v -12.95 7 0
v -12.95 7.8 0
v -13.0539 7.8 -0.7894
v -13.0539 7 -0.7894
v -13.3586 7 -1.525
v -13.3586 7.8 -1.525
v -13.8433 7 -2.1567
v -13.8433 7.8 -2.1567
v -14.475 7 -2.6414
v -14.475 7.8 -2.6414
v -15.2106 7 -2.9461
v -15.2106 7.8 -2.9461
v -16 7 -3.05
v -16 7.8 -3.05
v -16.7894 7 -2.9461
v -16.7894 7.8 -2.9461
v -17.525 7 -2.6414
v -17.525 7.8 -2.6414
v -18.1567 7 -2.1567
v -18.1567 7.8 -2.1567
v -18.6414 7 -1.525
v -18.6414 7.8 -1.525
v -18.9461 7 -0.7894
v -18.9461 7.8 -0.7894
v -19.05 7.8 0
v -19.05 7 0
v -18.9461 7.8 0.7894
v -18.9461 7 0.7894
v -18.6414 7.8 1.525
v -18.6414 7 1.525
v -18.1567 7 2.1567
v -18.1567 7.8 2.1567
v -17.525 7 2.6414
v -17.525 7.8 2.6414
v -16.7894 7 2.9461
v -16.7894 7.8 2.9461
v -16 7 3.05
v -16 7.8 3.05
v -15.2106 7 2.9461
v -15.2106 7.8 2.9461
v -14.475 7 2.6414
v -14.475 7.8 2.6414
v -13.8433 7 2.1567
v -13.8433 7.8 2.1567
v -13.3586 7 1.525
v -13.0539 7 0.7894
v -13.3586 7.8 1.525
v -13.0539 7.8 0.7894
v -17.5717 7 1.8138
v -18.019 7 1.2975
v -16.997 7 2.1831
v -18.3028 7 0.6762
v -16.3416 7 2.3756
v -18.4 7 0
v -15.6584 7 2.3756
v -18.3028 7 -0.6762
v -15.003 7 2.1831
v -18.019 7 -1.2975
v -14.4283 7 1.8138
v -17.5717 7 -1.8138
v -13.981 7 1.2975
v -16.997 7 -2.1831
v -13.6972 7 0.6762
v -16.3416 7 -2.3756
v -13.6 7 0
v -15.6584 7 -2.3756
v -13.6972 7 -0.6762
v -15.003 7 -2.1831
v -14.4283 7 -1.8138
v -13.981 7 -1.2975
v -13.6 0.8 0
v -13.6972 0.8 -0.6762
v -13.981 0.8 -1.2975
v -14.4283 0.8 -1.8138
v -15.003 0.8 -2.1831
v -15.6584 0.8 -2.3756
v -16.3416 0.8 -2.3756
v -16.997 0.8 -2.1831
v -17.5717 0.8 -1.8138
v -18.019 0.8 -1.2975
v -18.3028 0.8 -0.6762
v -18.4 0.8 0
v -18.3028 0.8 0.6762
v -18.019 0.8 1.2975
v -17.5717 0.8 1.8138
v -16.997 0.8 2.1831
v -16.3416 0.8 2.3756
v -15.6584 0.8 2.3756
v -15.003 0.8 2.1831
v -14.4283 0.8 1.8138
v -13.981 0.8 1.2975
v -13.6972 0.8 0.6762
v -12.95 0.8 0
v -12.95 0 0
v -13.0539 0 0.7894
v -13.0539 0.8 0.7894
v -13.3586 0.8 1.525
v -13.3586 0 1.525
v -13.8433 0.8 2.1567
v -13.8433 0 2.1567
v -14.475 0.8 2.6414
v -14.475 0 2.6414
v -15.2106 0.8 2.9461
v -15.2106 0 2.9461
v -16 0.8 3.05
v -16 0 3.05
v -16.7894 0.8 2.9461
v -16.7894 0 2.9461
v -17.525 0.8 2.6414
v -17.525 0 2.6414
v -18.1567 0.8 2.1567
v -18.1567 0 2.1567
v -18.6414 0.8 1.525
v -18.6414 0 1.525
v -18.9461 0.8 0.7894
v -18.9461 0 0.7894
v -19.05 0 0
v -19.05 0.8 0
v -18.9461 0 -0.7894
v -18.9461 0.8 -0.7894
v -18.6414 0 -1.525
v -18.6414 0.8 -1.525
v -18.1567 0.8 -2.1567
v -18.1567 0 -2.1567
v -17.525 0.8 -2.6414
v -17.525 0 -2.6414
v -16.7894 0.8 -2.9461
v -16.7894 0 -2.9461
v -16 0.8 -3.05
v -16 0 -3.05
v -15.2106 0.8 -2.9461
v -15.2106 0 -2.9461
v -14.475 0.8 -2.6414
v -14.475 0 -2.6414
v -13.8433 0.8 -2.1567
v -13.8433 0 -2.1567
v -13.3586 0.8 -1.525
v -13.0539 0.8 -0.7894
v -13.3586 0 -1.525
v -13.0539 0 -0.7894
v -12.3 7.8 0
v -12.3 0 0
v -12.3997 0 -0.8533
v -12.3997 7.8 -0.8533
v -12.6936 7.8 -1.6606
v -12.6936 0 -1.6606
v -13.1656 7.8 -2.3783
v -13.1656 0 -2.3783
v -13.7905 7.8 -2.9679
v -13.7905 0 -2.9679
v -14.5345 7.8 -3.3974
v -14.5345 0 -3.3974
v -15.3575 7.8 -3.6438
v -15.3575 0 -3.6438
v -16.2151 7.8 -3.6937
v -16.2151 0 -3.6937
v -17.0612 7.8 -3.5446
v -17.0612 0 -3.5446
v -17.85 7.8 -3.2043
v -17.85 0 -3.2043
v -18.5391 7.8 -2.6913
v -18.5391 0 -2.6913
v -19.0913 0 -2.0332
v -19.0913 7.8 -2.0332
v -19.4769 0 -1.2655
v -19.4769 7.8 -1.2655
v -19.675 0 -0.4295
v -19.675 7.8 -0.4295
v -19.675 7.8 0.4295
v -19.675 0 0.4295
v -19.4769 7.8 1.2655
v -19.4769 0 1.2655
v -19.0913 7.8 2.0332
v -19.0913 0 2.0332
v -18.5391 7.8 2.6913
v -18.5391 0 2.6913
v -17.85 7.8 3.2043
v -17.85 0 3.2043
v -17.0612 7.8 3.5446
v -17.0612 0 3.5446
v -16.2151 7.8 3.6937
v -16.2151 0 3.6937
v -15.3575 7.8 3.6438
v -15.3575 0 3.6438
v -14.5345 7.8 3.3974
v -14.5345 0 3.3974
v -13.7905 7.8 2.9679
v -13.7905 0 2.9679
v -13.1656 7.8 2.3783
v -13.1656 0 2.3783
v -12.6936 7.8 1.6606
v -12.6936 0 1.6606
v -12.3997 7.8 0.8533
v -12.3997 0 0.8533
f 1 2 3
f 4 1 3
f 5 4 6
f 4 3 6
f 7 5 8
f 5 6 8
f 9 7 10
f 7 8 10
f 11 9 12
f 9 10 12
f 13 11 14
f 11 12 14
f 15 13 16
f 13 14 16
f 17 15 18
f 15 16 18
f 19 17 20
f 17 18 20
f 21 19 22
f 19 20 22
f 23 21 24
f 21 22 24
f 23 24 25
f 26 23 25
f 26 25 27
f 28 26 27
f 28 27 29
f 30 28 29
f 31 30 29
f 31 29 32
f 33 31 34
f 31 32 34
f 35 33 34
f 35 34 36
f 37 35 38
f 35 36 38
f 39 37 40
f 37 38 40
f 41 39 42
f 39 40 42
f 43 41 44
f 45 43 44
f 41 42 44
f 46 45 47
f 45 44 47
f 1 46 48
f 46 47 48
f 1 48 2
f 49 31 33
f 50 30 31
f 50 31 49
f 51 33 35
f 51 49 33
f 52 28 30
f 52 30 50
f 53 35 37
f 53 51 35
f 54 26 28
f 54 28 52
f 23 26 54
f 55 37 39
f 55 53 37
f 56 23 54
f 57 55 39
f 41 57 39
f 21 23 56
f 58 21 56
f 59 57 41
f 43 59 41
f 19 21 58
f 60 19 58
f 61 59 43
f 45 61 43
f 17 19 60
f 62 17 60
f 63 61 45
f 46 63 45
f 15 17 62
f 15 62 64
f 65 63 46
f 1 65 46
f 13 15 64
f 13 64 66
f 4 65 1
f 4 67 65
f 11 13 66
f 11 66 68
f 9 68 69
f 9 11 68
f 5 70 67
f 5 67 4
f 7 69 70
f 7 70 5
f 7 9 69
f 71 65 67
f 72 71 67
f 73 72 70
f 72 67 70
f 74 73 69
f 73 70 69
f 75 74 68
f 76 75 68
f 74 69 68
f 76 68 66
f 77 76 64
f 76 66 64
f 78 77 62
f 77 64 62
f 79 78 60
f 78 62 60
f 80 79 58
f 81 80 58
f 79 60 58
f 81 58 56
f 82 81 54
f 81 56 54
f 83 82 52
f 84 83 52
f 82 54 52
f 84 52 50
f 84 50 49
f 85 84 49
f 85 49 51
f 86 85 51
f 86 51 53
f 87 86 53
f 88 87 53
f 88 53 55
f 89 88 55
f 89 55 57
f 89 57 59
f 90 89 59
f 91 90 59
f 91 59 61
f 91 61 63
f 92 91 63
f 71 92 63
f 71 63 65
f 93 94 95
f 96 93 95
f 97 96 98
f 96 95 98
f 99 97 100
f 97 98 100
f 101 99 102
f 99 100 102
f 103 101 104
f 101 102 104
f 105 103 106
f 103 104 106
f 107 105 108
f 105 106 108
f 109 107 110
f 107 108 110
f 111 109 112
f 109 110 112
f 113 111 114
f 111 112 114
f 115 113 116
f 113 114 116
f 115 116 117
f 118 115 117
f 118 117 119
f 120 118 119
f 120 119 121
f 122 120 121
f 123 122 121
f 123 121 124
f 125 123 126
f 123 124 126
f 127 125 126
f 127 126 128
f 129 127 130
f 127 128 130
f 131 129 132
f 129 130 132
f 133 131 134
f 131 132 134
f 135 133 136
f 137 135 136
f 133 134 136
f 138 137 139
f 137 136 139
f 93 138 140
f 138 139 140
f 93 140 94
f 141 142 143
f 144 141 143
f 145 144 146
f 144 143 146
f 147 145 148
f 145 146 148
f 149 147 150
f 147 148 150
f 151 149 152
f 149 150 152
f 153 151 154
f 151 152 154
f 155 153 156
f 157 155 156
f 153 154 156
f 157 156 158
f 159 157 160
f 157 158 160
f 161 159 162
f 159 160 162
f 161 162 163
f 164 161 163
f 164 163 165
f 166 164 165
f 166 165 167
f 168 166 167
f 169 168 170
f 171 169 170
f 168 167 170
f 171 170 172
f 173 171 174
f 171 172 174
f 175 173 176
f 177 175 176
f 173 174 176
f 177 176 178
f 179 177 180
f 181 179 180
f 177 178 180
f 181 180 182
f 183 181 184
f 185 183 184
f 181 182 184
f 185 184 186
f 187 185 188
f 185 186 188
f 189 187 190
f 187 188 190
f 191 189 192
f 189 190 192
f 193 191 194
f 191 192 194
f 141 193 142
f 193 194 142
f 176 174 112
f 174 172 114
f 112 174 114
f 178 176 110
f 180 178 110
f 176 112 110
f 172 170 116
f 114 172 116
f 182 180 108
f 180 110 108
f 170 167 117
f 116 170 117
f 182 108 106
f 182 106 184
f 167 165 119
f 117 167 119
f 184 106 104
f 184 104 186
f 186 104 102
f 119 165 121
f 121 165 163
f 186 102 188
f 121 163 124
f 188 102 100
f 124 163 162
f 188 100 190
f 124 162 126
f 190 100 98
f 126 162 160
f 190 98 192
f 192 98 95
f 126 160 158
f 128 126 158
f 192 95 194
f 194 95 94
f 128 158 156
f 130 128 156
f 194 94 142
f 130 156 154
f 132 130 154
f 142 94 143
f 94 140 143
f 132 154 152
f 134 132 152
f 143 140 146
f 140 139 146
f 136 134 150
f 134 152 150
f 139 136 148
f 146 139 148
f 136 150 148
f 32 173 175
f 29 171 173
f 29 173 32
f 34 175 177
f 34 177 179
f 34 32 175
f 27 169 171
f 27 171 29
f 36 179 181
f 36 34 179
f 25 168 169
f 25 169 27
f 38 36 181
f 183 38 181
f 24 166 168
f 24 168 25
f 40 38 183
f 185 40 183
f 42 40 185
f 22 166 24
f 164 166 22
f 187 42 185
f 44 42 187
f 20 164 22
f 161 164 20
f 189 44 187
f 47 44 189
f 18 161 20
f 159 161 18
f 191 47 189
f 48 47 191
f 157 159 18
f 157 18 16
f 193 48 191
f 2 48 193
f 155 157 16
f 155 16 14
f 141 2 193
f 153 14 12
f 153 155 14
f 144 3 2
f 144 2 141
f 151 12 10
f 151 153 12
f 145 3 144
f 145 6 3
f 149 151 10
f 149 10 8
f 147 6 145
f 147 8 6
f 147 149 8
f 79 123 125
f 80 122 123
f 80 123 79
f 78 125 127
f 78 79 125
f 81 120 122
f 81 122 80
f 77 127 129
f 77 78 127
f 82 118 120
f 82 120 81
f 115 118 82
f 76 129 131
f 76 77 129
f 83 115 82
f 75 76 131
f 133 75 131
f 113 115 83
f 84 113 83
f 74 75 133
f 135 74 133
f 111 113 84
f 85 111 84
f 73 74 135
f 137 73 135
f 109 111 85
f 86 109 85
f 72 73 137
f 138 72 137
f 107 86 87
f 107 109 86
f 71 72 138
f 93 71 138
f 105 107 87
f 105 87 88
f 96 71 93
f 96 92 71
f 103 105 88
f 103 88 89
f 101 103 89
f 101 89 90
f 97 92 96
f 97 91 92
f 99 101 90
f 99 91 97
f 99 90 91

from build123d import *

# Parameters (mm, degrees)
SKETCH1_R           = 3.7
BOSS_EXTRUDE3_DEPTH = 7.8
SKETCH2_R           = 2.4
CUT_EXTRUDE6_DEPTH  = 7.8
SKETCH3_R           = 3.05
CUT_EXTRUDE7_DEPTH  = 0.8
SKETCH4_R           = 3.05
CUT_EXTRUDE8_DEPTH  = 0.8


with BuildPart() as part:
    # Sketch1 → Boss-Extrude3 (new body)
    with BuildSketch(Plane(origin=(0, 0, 0), x_dir=(1, 0, 0), z_dir=(0, 1, 0))):
        with Locations((-16, 0)):
            Circle(SKETCH1_R)
    extrude(amount=BOSS_EXTRUDE3_DEPTH)

    # Sketch2 → Cut-Extrude6 (cut)
    with BuildSketch(Plane(origin=(0, 7.8, 0), x_dir=(1, 0, 0), z_dir=(0, 1, 0))):
        with Locations((-16, 0)):
            Circle(SKETCH2_R)
    extrude(amount=-CUT_EXTRUDE6_DEPTH, mode=Mode.SUBTRACT)

    # Sketch3 → Cut-Extrude7 (cut)
    with BuildSketch(Plane(origin=(0, 7.8, 0), x_dir=(1, 0, 0), z_dir=(0, 1, 0))):
        with Locations((-16, 0)):
            Circle(SKETCH3_R)
    extrude(amount=-CUT_EXTRUDE7_DEPTH, mode=Mode.SUBTRACT)

    # Sketch4 → Cut-Extrude8 (cut)
    with BuildSketch(Plane.XZ):
        with Locations((-16, 0)):
            Circle(SKETCH4_R)
    extrude(amount=-CUT_EXTRUDE8_DEPTH, mode=Mode.SUBTRACT)


solid = part.part
